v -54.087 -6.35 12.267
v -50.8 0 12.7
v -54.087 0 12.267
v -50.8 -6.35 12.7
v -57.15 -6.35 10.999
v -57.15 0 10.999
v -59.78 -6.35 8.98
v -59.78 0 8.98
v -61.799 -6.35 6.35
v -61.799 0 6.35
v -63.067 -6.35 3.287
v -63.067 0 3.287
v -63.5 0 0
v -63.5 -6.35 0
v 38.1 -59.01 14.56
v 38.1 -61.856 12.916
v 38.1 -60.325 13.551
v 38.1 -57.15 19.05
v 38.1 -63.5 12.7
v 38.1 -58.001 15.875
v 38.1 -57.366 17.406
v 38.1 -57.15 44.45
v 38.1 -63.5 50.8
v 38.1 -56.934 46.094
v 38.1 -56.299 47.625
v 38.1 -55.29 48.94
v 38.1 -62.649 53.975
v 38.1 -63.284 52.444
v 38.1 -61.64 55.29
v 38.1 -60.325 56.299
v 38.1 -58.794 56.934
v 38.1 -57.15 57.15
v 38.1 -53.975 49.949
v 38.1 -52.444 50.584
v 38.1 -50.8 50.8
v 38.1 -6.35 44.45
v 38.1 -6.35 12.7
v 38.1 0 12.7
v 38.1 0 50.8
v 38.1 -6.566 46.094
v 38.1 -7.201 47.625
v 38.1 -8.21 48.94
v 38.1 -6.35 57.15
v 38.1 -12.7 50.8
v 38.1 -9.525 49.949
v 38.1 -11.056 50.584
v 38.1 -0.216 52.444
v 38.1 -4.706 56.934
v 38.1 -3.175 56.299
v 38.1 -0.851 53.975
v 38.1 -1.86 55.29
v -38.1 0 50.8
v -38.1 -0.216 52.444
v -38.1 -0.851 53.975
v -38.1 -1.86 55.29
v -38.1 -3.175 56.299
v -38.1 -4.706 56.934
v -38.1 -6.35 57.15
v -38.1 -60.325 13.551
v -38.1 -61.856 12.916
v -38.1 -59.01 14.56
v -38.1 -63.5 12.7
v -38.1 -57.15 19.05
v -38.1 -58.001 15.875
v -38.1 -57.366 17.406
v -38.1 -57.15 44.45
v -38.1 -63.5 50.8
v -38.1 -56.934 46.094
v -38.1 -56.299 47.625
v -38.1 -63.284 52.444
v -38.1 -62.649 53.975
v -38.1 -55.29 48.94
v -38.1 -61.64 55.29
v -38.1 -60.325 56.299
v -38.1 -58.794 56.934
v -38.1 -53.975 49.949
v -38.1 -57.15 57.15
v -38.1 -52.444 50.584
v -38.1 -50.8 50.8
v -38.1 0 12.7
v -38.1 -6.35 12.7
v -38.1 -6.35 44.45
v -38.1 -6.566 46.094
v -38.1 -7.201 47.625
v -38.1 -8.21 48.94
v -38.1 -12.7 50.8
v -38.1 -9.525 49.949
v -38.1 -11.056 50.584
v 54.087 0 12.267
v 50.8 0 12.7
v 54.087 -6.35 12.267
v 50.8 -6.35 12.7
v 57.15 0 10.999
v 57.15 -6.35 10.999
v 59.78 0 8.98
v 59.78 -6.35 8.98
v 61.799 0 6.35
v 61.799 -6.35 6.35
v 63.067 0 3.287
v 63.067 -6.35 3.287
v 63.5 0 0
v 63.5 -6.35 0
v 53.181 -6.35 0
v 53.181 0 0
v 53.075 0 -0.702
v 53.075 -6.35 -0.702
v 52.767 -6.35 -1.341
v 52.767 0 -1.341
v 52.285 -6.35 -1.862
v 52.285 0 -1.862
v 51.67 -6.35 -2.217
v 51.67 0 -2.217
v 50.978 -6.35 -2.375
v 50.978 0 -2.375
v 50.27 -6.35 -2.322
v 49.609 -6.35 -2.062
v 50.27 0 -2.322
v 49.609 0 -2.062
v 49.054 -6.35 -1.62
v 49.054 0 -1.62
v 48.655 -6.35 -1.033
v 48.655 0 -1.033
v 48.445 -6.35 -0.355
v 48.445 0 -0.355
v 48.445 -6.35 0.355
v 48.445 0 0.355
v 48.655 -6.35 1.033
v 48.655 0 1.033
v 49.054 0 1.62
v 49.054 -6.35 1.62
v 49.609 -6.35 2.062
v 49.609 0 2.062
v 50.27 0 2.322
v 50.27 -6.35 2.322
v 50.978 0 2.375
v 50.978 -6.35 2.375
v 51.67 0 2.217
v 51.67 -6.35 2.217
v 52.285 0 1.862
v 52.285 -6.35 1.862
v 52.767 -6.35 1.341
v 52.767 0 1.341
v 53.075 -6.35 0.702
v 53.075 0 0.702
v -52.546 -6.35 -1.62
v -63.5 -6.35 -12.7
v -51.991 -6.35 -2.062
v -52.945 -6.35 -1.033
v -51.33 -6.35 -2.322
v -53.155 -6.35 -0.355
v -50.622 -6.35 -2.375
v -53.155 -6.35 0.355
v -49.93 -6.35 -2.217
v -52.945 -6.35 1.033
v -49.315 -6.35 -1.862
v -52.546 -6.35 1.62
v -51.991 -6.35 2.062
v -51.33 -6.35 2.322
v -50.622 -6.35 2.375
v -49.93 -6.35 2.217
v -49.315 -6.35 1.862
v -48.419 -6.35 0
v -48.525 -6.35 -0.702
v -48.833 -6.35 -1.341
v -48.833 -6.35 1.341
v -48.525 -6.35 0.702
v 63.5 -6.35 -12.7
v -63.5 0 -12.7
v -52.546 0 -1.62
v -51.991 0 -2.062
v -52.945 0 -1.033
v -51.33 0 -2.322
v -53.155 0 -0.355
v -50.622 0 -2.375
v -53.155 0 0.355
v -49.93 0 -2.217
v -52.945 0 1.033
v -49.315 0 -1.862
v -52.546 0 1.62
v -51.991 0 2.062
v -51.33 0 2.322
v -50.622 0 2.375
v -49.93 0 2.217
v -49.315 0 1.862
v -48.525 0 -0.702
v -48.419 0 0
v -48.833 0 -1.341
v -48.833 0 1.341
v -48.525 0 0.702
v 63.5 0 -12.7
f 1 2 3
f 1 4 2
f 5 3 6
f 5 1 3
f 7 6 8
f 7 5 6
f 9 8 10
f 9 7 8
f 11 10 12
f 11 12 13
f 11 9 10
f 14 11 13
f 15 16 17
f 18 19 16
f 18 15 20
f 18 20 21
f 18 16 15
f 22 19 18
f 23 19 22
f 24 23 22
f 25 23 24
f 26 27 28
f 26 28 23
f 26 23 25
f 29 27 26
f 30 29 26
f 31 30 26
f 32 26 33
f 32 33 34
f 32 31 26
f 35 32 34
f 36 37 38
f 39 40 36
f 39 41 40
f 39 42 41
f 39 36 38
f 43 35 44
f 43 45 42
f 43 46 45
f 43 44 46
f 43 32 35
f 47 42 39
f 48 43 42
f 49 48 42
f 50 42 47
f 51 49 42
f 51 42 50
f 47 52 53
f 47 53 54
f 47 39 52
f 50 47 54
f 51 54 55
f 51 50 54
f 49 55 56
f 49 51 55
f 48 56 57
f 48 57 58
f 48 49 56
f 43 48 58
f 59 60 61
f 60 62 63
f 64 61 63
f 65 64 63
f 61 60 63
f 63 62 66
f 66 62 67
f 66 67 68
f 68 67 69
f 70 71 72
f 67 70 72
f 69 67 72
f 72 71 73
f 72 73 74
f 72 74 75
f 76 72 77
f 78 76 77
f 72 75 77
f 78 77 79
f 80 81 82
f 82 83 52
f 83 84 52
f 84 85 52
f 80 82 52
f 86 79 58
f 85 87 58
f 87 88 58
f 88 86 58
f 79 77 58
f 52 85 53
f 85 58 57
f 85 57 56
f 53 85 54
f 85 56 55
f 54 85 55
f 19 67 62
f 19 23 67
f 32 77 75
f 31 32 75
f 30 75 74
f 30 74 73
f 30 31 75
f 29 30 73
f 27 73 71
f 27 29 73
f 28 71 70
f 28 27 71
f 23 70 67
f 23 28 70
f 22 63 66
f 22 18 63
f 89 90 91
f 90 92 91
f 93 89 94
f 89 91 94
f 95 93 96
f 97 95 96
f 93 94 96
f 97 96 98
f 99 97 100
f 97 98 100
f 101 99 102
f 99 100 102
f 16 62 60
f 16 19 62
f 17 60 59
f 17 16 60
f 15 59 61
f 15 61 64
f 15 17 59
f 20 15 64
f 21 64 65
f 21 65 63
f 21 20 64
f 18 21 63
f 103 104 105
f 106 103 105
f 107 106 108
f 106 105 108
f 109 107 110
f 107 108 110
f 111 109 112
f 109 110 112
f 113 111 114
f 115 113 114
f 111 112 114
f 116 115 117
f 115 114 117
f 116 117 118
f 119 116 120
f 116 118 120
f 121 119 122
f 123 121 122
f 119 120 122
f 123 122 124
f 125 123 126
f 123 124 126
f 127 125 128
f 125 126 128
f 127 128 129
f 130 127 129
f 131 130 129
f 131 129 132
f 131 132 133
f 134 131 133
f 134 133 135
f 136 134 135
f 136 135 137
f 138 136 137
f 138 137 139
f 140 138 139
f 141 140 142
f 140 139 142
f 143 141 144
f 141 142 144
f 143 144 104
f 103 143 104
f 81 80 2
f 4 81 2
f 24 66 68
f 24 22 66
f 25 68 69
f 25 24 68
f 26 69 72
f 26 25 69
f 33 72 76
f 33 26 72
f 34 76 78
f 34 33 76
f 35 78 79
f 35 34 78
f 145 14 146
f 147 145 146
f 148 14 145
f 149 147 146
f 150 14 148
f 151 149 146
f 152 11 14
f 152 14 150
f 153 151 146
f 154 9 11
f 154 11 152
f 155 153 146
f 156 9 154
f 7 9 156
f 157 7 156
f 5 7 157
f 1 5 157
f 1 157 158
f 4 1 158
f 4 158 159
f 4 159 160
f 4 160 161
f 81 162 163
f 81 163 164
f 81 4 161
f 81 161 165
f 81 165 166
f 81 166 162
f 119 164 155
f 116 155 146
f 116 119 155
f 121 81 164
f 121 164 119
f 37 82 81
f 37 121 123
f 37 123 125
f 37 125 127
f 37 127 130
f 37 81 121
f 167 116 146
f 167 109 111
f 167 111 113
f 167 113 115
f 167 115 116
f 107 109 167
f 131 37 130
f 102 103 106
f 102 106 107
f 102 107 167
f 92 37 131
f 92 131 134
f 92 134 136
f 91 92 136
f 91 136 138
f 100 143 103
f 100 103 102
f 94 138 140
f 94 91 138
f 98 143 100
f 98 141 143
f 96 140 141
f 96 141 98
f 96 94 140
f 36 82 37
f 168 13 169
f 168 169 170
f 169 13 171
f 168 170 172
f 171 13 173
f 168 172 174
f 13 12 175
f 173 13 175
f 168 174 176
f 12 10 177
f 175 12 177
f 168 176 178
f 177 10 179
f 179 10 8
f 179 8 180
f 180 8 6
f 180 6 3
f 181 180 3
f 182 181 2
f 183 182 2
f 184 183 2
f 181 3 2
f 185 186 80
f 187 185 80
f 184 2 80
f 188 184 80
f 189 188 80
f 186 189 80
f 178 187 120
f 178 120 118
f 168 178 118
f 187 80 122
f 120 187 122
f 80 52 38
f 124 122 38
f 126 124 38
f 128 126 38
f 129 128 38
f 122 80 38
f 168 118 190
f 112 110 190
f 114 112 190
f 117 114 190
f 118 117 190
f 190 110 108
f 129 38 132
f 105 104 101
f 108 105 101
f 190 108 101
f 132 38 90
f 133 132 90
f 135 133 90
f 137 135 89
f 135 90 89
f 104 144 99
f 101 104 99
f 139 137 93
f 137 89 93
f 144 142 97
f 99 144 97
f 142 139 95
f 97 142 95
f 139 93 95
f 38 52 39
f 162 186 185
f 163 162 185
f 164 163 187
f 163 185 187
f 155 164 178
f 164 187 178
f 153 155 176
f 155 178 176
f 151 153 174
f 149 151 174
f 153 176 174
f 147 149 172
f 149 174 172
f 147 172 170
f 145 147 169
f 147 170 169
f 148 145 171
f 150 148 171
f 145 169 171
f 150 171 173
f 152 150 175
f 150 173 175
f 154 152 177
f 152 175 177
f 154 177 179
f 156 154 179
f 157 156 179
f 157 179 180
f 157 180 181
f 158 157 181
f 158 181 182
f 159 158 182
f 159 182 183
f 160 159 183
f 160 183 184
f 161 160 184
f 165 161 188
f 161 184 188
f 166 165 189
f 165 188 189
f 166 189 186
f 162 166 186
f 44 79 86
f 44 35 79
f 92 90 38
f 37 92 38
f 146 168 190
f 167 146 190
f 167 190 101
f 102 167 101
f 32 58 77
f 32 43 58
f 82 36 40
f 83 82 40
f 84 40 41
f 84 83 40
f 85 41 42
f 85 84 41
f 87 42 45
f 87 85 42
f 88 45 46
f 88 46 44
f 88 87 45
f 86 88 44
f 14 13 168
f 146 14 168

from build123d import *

# Parameters (mm, degrees)
F1_DEPTH = 6.35
F2_R     = 12.7
F4_DEPTH = 38.1
F5_R     = 6.34999


# Not quite as in the source:
# - a fillet or chamfer is up to 0.001 mm smaller than in the source, because OpenCascade refuses the exact size


with BuildPart() as f1:
    # F0 (on Front) → F1 (new body)
    with BuildSketch(Plane.XZ):
        with BuildLine():
            Line((63.5, 0), (63.5, 12.7))
            Line((63.5, 12.7), (-63.5, 12.7))
            Line((-63.5, 12.7), (-63.5, 0))
            Line((-63.5, 0), (-53.18125, 0))
            ThreePointArc((-53.18125, 0), (-50.8, 2.38125), (-48.41875, 0))
            Line((-48.41875, 0), (48.41875, 0))
            ThreePointArc((48.41875, 0), (50.8, 2.38125), (53.18125, 0))
            Line((53.18125, 0), (63.5, 0))
        make_face()
        with BuildLine():
            Line((63.5, -12.7), (63.5, 0))
            Line((63.5, 0), (53.18125, 0))
            ThreePointArc((53.18125, 0), (50.8, -2.38125), (48.41875, 0))
            Line((48.41875, 0), (-48.41875, 0))
            ThreePointArc((-48.41875, 0), (-50.8, -2.38125), (-53.18125, 0))
            Line((-53.18125, 0), (-63.5, 0))
            Line((-63.5, 0), (-63.5, -12.7))
            Line((-63.5, -12.7), (63.5, -12.7))
        make_face()
    extrude(amount=F1_DEPTH)

    # F2
    f2_edges = [f1.edges().sort_by_distance(p)[0] for p in [
        (-63.5, -3.175, 12.7),
        (63.5, -3.175, 12.7),
    ]]
    fillet(f2_edges, radius=F2_R)

    # F3 (on Right) → F4 (join, symmetric)
    with BuildSketch(Plane.YZ):
        Polygon((0, 12.7), (0, 57.15), (-63.5, 57.15), (-63.5, 12.7), (-57.15, 12.7), (-57.15, 50.8), (-6.35, 50.8), (-6.35, 12.7), align=None)
    extrude(amount=F4_DEPTH, both=True)

    # F5 (radius 6.35 in the source; OpenCascade refuses exactly that, so slightly less here)
    f5_edges = [f1.edges().sort_by_distance(p)[0] for p in [
        (0, 0, 57.15),
        (0, -63.5, 57.15),
        (0, -6.35, 50.8),
        (0, -57.15, 50.8),
        (0, -57.15, 12.7),
    ]]
    fillet(f5_edges, radius=F5_R)


solid = f1.part
